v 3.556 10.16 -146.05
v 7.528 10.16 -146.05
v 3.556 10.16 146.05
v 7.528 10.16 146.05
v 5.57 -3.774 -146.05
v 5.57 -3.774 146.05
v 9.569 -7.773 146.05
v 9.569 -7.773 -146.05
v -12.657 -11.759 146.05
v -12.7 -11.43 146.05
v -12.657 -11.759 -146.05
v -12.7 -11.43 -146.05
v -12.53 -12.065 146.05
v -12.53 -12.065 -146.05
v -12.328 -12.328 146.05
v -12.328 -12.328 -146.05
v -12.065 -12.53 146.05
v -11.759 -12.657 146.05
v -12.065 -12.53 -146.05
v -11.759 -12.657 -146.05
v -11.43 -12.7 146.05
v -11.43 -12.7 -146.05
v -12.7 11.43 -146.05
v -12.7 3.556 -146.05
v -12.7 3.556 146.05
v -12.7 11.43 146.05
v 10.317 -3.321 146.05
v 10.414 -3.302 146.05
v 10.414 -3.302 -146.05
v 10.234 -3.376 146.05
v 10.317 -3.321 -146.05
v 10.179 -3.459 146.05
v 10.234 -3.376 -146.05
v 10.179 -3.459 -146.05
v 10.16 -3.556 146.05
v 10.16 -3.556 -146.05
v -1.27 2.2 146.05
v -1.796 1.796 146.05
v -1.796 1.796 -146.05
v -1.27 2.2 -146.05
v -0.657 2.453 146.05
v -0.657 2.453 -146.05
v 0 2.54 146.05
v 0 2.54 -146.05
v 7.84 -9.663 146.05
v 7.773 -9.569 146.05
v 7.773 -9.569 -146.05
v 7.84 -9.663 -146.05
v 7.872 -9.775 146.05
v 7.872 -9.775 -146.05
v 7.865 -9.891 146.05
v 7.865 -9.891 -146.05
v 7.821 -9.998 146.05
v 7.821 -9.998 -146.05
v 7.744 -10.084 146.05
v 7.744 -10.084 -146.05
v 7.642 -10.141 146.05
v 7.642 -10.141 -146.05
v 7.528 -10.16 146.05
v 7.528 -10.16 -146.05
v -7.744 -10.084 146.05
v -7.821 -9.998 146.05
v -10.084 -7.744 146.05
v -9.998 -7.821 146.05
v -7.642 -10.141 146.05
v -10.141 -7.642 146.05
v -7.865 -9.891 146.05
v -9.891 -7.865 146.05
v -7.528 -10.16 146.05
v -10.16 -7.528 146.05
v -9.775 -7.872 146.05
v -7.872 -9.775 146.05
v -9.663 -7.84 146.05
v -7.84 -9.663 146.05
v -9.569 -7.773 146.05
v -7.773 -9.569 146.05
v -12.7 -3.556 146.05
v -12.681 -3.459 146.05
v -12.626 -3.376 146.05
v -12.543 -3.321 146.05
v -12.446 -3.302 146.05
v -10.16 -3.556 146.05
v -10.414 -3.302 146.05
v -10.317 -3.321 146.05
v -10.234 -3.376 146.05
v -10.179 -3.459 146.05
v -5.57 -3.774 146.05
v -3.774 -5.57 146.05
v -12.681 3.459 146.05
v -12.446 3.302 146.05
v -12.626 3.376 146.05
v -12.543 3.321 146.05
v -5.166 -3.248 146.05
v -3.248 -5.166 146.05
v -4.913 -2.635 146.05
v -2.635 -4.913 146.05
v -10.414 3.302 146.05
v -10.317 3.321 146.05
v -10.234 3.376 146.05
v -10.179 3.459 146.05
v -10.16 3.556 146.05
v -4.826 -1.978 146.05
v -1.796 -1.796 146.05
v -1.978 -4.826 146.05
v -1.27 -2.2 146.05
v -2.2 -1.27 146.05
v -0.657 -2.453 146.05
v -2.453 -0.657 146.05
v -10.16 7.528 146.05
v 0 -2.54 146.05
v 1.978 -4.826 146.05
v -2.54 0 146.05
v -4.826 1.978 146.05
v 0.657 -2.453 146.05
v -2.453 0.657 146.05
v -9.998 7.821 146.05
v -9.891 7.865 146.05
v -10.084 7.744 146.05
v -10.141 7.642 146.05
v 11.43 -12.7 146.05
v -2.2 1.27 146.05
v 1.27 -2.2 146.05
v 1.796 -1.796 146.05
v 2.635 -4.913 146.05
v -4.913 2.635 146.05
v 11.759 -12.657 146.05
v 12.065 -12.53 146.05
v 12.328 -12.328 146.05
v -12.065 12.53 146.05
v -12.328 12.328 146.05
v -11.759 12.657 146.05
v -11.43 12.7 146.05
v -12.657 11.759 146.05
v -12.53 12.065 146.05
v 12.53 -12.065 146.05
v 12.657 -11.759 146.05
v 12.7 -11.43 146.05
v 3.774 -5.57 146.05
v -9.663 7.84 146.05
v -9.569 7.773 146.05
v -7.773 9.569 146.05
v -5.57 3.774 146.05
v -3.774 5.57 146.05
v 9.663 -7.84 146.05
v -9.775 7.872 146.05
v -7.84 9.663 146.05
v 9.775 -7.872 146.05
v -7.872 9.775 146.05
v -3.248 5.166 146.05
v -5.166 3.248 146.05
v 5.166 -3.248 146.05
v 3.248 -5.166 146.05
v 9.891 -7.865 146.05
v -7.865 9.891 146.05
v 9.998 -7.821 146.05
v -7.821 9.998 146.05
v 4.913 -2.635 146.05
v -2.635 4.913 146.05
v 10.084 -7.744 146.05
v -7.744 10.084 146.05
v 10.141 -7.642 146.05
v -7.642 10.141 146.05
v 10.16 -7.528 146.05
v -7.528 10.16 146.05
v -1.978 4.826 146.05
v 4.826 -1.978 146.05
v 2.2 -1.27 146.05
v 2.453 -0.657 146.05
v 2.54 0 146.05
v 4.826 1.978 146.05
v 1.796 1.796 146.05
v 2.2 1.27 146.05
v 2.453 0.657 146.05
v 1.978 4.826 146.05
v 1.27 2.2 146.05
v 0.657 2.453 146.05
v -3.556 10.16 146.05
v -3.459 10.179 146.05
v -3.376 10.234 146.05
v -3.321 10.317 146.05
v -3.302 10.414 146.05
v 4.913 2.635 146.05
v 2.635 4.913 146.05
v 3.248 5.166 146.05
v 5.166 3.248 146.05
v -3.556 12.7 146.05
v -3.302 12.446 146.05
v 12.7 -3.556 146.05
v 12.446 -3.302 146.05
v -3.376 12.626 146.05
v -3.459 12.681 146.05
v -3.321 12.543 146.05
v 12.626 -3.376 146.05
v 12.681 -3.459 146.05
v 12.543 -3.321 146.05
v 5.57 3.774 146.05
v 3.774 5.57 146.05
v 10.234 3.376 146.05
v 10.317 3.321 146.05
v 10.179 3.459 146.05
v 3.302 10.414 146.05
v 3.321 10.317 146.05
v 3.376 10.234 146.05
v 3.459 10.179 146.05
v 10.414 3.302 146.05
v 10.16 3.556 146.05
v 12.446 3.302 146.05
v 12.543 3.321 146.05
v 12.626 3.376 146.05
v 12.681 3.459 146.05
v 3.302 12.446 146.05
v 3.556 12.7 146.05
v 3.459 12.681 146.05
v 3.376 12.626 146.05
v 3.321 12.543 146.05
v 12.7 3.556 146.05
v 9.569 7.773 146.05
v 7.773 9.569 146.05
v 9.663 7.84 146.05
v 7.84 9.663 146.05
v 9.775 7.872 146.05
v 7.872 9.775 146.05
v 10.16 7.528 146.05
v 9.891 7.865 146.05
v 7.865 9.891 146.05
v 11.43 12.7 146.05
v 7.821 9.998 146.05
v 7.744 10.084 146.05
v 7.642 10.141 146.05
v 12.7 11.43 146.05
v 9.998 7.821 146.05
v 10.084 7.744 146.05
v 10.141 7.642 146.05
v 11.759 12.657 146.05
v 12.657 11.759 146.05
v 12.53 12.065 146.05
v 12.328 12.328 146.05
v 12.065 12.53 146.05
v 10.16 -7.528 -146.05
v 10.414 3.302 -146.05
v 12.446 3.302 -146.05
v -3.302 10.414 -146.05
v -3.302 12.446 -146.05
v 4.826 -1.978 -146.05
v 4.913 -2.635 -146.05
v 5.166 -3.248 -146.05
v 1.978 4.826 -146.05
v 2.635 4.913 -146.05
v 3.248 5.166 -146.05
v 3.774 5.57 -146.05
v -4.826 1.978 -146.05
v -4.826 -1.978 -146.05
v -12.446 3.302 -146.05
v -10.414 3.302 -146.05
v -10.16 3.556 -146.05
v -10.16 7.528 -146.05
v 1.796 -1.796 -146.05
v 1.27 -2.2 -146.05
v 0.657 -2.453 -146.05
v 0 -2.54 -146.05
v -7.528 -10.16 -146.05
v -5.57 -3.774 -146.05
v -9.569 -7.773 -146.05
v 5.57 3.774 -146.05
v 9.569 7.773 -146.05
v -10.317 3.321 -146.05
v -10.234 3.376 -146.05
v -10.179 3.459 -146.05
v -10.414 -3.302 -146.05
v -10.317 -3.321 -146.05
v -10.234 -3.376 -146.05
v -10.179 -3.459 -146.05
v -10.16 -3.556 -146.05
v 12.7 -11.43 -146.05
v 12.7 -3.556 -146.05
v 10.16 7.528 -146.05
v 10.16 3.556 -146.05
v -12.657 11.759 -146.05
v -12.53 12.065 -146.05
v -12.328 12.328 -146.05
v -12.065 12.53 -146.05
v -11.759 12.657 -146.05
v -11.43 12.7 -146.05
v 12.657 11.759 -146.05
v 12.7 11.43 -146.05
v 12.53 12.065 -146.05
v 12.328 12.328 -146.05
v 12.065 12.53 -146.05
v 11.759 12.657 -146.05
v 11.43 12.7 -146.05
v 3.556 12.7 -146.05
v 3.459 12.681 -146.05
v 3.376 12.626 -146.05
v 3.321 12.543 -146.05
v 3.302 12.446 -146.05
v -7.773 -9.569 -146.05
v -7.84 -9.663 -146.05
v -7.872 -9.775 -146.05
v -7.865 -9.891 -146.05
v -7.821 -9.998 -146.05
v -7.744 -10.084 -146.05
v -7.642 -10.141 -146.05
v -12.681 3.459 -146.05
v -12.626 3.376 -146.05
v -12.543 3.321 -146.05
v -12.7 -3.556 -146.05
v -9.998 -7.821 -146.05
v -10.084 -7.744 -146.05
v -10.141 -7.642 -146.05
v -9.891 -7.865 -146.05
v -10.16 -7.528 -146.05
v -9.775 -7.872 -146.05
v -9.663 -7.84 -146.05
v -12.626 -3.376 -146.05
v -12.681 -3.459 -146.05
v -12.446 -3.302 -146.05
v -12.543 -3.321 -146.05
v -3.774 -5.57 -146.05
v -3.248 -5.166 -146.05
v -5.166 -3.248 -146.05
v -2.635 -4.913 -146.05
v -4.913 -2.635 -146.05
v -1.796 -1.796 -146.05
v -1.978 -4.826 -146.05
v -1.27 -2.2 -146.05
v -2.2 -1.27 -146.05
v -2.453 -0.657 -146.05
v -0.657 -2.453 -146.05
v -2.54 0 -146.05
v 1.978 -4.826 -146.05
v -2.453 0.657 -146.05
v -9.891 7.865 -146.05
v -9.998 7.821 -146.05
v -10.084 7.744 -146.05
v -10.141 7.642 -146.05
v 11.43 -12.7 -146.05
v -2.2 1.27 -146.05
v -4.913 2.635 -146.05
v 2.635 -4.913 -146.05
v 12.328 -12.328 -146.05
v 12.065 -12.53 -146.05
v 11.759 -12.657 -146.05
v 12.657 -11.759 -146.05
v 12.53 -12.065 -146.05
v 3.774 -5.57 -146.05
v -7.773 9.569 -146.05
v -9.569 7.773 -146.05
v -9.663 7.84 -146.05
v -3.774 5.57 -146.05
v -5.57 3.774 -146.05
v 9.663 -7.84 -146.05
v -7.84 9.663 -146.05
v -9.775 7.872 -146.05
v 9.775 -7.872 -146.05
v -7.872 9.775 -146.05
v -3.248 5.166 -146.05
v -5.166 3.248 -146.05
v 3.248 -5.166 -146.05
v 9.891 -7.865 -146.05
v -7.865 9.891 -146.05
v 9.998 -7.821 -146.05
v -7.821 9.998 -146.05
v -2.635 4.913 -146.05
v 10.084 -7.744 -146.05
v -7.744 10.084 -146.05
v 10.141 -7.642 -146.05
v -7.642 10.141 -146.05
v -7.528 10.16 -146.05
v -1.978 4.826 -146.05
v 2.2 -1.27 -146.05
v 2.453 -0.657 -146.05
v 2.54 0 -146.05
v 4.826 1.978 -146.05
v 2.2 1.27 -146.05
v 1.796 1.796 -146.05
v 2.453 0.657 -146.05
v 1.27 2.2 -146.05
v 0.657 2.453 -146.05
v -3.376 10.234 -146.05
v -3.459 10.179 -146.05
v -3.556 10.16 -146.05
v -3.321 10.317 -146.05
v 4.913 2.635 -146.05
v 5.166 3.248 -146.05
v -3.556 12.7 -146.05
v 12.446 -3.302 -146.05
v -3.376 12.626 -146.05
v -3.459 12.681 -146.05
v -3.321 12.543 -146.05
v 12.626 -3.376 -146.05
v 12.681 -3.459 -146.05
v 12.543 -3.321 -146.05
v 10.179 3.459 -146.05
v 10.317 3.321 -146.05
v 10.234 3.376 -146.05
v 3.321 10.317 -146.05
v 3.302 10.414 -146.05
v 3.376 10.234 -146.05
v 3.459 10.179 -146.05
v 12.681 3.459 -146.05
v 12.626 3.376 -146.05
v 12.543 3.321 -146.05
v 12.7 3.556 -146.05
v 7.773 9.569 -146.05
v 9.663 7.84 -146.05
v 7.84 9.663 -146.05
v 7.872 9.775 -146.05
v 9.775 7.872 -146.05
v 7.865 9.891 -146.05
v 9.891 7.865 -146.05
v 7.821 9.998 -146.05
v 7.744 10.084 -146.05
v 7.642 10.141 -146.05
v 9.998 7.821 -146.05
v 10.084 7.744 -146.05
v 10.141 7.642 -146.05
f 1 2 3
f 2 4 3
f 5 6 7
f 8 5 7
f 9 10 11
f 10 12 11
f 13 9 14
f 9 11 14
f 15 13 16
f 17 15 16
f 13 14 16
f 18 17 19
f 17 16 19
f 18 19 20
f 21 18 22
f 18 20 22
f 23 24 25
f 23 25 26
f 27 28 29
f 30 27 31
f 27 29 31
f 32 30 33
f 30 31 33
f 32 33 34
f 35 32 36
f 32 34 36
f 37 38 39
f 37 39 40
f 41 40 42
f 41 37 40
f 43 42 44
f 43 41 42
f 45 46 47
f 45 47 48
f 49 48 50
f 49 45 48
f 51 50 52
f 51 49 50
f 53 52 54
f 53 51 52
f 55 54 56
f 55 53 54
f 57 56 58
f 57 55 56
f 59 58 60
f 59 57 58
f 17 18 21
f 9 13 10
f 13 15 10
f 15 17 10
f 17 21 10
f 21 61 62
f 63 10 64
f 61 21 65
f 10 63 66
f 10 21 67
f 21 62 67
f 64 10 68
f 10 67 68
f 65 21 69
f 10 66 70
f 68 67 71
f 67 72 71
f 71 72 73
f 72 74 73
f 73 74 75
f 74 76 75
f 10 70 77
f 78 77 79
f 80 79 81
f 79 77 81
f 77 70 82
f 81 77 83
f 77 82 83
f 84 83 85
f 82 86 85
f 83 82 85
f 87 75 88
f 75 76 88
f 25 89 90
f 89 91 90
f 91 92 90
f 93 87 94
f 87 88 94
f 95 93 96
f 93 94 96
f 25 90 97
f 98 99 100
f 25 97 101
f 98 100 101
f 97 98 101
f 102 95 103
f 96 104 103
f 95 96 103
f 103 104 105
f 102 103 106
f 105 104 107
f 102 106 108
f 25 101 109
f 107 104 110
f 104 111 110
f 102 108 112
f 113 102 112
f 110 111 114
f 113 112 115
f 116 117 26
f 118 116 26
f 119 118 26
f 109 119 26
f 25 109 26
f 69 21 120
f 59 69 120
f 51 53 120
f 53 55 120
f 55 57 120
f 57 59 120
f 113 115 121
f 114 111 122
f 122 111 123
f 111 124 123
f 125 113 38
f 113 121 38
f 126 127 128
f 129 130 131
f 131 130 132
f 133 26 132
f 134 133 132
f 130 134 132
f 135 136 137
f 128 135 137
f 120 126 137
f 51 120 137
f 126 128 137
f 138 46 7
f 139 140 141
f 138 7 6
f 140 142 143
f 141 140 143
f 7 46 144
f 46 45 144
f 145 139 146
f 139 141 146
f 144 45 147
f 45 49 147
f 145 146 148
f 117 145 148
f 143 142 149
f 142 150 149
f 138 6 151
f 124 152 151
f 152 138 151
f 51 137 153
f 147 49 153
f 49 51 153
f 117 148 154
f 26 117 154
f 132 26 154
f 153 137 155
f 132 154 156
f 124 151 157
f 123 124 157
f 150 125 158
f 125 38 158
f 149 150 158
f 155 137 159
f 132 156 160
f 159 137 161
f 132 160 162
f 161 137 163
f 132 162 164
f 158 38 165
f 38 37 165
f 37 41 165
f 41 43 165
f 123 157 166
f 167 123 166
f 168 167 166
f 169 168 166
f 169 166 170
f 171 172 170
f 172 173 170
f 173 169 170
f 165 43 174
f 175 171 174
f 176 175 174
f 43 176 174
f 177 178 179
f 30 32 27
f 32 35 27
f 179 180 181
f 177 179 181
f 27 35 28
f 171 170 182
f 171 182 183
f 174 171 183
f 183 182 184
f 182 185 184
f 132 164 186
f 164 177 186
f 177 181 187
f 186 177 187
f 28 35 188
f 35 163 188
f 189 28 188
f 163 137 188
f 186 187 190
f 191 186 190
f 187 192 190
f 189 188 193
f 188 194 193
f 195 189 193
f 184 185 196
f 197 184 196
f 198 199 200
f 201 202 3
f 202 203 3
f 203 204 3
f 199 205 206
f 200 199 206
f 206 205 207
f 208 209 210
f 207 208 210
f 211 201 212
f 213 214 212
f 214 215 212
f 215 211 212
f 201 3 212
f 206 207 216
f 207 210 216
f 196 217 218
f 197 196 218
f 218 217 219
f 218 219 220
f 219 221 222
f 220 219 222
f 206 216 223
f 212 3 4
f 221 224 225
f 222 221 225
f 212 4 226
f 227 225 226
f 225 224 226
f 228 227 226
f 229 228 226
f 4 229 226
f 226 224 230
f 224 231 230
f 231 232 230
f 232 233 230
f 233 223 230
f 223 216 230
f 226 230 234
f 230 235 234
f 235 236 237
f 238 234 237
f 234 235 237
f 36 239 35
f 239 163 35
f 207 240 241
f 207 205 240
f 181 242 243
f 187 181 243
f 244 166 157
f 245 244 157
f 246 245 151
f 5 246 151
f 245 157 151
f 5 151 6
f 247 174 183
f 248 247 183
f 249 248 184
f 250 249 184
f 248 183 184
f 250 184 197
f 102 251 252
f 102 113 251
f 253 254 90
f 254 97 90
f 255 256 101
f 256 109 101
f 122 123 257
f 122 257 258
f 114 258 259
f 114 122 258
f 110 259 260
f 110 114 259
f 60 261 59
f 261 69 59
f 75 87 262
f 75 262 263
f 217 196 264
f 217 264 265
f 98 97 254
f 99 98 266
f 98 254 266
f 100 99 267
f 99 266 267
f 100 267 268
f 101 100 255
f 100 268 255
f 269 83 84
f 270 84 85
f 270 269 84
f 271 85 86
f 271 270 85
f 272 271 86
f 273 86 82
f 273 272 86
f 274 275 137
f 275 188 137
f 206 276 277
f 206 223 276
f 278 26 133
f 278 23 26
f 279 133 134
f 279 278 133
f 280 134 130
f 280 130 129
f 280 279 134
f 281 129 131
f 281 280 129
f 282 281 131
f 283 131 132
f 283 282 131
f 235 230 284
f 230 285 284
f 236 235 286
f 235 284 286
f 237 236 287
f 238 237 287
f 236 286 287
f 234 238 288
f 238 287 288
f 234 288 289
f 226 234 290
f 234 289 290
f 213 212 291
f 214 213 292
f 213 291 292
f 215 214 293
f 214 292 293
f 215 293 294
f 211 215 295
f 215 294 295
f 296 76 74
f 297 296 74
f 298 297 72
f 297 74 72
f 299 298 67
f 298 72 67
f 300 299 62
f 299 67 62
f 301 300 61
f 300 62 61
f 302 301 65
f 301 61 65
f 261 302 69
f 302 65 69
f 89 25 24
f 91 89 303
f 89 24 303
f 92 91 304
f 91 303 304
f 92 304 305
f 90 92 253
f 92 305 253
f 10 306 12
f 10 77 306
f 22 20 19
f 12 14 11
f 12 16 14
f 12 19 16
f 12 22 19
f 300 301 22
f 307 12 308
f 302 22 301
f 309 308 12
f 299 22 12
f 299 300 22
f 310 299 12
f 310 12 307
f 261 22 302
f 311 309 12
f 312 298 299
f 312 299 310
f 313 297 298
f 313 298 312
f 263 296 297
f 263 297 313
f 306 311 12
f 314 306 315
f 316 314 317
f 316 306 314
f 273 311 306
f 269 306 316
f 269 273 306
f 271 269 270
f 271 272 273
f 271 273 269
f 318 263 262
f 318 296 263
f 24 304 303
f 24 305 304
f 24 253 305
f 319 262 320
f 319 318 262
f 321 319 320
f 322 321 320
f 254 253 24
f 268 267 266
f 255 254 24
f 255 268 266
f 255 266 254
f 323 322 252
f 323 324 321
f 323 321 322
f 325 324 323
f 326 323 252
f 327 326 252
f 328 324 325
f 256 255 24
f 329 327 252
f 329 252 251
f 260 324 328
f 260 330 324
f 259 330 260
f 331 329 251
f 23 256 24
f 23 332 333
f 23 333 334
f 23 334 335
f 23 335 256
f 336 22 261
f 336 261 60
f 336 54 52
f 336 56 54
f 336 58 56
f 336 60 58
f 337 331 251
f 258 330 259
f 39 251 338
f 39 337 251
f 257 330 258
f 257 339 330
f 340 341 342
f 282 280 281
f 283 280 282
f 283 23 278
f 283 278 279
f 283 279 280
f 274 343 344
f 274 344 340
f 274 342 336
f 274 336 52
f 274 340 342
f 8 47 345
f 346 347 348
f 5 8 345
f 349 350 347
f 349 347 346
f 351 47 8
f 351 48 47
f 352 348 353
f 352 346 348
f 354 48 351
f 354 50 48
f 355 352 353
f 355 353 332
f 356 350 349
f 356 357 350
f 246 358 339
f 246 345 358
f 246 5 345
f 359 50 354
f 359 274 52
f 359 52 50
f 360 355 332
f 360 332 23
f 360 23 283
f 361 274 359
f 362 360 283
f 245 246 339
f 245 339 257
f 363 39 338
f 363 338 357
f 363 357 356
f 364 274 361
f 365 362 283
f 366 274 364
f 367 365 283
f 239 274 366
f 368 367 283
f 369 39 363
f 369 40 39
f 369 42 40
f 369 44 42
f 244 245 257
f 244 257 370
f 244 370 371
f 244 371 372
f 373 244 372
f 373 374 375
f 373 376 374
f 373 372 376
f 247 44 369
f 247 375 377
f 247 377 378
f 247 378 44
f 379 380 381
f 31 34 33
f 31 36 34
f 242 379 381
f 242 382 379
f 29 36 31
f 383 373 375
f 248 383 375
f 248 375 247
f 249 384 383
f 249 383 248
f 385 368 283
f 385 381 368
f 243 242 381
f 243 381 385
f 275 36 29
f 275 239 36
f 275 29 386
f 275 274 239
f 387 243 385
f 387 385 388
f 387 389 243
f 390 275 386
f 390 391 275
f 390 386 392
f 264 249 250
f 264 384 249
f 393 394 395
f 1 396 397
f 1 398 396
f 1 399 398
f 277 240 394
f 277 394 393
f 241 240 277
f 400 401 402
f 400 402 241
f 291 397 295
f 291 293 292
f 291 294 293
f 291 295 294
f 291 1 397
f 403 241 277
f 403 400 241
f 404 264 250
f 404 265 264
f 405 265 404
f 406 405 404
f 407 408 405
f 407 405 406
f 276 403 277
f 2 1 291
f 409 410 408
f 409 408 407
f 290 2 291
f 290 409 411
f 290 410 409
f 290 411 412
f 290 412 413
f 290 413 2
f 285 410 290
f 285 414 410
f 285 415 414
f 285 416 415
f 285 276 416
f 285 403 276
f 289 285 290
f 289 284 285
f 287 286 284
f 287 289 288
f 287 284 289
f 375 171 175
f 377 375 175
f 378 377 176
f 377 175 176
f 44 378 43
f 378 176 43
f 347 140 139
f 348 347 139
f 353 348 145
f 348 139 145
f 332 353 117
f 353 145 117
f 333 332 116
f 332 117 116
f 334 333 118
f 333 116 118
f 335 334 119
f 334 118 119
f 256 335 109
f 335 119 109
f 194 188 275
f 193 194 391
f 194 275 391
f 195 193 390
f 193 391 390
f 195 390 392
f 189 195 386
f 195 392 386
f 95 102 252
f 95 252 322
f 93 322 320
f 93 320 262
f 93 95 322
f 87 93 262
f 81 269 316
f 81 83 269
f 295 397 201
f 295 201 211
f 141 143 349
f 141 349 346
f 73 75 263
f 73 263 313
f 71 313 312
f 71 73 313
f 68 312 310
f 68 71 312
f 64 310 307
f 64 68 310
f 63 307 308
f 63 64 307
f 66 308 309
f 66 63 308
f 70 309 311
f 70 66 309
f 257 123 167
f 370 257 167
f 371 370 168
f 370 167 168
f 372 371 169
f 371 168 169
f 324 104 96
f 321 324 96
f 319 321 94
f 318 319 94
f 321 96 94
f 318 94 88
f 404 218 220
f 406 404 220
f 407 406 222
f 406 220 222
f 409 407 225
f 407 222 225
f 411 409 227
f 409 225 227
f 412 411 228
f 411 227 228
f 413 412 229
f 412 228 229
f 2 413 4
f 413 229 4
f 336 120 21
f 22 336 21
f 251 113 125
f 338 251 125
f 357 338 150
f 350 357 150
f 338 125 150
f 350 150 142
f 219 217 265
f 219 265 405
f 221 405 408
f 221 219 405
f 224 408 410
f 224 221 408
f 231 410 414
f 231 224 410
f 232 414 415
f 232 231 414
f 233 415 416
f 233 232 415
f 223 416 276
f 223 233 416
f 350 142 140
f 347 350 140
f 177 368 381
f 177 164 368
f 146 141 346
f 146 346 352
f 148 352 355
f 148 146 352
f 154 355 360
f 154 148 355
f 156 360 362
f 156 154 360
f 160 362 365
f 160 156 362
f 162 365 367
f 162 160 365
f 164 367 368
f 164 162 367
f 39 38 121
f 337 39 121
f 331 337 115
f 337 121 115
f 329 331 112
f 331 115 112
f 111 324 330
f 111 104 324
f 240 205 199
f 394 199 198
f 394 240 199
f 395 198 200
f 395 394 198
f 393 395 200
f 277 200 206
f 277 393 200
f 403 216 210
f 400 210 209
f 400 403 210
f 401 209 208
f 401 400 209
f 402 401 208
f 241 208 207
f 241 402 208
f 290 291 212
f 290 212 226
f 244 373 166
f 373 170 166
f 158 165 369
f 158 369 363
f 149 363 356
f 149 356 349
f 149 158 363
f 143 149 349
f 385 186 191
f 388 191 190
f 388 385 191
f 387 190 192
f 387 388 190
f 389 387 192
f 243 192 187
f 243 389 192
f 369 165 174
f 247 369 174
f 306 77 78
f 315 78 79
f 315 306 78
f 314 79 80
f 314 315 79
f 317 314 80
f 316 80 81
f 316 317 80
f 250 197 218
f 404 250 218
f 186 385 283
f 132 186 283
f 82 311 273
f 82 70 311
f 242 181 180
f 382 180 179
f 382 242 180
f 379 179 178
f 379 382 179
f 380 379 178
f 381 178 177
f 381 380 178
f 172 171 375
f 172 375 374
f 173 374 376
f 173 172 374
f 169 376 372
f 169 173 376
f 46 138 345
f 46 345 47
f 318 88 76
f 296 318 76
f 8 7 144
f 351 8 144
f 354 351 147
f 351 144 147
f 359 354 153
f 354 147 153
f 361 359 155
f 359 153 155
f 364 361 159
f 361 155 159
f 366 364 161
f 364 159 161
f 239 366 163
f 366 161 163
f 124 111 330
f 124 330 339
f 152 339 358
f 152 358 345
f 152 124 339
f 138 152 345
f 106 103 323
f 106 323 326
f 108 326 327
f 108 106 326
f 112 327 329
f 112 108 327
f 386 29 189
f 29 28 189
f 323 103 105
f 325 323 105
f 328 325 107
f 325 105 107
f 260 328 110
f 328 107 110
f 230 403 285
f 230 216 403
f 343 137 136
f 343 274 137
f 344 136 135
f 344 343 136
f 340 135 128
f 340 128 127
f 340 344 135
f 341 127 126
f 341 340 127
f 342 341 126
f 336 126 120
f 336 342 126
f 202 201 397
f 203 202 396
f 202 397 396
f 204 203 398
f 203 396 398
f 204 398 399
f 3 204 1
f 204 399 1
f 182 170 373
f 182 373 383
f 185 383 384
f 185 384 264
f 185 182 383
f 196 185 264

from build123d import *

# Parameters (mm, degrees)
BOSS_EXTRUDE1_DEPTH = 146.05
FILLET2_R           = 0.254
FILLET1_R           = 1.27
SKETCH5_W           = 7.112
SKETCH5_H           = 2.54
BOSS_EXTRUDE2_DEPTH = 292.1


with BuildPart() as part:
    # Sketch3 → Boss-Extrude1 (new body, symmetric)
    with BuildSketch(Plane.XY):
        with BuildLine():
            Line((-12.7, 12.7), (-1.796051224, 1.796051224))
            ThreePointArc((-1.796051224, 1.796051224), (-0.972015918, 2.346654013), (0, 2.54))
            Line((0, 2.54), (0, 4.826))
            Line((0, 4.826), (-1.977846327, 4.826))
            ThreePointArc((-1.977846327, 4.826), (-2.949862246, 5.019345987), (-3.773897552, 5.569948776))
            Line((-3.773897552, 5.569948776), (-7.772528286, 9.56857951))
            ThreePointArc((-7.772528286, 9.56857951), (-7.847628361, 9.946133082), (-7.527553898, 10.16))
            Line((-7.527553898, 10.16), (-3.302, 10.16))
            Line((-3.302, 10.16), (-3.302, 12.7))
            Line((-3.302, 12.7), (-12.7, 12.7))
        make_face()
    extrude(amount=BOSS_EXTRUDE1_DEPTH, both=True)

    # Fillet2
    fillet2_edges = [part.edges().sort_by_distance(p)[0] for p in [
        (-3.302, 12.7, 0),
        (-3.302, 10.16, 0),
    ]]
    fillet(fillet2_edges, radius=FILLET2_R)

    # Mirror1: part across plane


with BuildPart() as part_1:
    add(part.part)
    add(part.part.mirror(Plane(origin=(0, 0, 146.05), x_dir=(0, 0, 1), z_dir=(0.707106781, 0.707106781, 0))))

    # Fillet1
    fillet1_edges = [part_1.edges().sort_by_distance(p)[0] for p in [
        (-12.7, 12.7, 0),
    ]]
    fillet(fillet1_edges, radius=FILLET1_R)

    # Mirror2: part across plane


with BuildPart() as part_2:
    add(part_1.part)
    add(part_1.part.mirror(Plane(origin=(0, 0, 146.05), x_dir=(0, 0, 1), z_dir=(0, 1, 0))))

    # Mirror5: part across plane


with BuildPart() as part_3:
    add(part_2.part)
    add(part_2.part.mirror(Plane(origin=(0, 0, 146.05), x_dir=(0, 0, 1), z_dir=(-1, 0, 0))))

    # Sketch5 → Boss-Extrude2 (add, through all)
    with BuildSketch(Plane.XY.offset(146.05)):
        with Locations((0, -11.43)):
            Rectangle(SKETCH5_W, SKETCH5_H)
    extrude(amount=-BOSS_EXTRUDE2_DEPTH)


solid = part_3.part
